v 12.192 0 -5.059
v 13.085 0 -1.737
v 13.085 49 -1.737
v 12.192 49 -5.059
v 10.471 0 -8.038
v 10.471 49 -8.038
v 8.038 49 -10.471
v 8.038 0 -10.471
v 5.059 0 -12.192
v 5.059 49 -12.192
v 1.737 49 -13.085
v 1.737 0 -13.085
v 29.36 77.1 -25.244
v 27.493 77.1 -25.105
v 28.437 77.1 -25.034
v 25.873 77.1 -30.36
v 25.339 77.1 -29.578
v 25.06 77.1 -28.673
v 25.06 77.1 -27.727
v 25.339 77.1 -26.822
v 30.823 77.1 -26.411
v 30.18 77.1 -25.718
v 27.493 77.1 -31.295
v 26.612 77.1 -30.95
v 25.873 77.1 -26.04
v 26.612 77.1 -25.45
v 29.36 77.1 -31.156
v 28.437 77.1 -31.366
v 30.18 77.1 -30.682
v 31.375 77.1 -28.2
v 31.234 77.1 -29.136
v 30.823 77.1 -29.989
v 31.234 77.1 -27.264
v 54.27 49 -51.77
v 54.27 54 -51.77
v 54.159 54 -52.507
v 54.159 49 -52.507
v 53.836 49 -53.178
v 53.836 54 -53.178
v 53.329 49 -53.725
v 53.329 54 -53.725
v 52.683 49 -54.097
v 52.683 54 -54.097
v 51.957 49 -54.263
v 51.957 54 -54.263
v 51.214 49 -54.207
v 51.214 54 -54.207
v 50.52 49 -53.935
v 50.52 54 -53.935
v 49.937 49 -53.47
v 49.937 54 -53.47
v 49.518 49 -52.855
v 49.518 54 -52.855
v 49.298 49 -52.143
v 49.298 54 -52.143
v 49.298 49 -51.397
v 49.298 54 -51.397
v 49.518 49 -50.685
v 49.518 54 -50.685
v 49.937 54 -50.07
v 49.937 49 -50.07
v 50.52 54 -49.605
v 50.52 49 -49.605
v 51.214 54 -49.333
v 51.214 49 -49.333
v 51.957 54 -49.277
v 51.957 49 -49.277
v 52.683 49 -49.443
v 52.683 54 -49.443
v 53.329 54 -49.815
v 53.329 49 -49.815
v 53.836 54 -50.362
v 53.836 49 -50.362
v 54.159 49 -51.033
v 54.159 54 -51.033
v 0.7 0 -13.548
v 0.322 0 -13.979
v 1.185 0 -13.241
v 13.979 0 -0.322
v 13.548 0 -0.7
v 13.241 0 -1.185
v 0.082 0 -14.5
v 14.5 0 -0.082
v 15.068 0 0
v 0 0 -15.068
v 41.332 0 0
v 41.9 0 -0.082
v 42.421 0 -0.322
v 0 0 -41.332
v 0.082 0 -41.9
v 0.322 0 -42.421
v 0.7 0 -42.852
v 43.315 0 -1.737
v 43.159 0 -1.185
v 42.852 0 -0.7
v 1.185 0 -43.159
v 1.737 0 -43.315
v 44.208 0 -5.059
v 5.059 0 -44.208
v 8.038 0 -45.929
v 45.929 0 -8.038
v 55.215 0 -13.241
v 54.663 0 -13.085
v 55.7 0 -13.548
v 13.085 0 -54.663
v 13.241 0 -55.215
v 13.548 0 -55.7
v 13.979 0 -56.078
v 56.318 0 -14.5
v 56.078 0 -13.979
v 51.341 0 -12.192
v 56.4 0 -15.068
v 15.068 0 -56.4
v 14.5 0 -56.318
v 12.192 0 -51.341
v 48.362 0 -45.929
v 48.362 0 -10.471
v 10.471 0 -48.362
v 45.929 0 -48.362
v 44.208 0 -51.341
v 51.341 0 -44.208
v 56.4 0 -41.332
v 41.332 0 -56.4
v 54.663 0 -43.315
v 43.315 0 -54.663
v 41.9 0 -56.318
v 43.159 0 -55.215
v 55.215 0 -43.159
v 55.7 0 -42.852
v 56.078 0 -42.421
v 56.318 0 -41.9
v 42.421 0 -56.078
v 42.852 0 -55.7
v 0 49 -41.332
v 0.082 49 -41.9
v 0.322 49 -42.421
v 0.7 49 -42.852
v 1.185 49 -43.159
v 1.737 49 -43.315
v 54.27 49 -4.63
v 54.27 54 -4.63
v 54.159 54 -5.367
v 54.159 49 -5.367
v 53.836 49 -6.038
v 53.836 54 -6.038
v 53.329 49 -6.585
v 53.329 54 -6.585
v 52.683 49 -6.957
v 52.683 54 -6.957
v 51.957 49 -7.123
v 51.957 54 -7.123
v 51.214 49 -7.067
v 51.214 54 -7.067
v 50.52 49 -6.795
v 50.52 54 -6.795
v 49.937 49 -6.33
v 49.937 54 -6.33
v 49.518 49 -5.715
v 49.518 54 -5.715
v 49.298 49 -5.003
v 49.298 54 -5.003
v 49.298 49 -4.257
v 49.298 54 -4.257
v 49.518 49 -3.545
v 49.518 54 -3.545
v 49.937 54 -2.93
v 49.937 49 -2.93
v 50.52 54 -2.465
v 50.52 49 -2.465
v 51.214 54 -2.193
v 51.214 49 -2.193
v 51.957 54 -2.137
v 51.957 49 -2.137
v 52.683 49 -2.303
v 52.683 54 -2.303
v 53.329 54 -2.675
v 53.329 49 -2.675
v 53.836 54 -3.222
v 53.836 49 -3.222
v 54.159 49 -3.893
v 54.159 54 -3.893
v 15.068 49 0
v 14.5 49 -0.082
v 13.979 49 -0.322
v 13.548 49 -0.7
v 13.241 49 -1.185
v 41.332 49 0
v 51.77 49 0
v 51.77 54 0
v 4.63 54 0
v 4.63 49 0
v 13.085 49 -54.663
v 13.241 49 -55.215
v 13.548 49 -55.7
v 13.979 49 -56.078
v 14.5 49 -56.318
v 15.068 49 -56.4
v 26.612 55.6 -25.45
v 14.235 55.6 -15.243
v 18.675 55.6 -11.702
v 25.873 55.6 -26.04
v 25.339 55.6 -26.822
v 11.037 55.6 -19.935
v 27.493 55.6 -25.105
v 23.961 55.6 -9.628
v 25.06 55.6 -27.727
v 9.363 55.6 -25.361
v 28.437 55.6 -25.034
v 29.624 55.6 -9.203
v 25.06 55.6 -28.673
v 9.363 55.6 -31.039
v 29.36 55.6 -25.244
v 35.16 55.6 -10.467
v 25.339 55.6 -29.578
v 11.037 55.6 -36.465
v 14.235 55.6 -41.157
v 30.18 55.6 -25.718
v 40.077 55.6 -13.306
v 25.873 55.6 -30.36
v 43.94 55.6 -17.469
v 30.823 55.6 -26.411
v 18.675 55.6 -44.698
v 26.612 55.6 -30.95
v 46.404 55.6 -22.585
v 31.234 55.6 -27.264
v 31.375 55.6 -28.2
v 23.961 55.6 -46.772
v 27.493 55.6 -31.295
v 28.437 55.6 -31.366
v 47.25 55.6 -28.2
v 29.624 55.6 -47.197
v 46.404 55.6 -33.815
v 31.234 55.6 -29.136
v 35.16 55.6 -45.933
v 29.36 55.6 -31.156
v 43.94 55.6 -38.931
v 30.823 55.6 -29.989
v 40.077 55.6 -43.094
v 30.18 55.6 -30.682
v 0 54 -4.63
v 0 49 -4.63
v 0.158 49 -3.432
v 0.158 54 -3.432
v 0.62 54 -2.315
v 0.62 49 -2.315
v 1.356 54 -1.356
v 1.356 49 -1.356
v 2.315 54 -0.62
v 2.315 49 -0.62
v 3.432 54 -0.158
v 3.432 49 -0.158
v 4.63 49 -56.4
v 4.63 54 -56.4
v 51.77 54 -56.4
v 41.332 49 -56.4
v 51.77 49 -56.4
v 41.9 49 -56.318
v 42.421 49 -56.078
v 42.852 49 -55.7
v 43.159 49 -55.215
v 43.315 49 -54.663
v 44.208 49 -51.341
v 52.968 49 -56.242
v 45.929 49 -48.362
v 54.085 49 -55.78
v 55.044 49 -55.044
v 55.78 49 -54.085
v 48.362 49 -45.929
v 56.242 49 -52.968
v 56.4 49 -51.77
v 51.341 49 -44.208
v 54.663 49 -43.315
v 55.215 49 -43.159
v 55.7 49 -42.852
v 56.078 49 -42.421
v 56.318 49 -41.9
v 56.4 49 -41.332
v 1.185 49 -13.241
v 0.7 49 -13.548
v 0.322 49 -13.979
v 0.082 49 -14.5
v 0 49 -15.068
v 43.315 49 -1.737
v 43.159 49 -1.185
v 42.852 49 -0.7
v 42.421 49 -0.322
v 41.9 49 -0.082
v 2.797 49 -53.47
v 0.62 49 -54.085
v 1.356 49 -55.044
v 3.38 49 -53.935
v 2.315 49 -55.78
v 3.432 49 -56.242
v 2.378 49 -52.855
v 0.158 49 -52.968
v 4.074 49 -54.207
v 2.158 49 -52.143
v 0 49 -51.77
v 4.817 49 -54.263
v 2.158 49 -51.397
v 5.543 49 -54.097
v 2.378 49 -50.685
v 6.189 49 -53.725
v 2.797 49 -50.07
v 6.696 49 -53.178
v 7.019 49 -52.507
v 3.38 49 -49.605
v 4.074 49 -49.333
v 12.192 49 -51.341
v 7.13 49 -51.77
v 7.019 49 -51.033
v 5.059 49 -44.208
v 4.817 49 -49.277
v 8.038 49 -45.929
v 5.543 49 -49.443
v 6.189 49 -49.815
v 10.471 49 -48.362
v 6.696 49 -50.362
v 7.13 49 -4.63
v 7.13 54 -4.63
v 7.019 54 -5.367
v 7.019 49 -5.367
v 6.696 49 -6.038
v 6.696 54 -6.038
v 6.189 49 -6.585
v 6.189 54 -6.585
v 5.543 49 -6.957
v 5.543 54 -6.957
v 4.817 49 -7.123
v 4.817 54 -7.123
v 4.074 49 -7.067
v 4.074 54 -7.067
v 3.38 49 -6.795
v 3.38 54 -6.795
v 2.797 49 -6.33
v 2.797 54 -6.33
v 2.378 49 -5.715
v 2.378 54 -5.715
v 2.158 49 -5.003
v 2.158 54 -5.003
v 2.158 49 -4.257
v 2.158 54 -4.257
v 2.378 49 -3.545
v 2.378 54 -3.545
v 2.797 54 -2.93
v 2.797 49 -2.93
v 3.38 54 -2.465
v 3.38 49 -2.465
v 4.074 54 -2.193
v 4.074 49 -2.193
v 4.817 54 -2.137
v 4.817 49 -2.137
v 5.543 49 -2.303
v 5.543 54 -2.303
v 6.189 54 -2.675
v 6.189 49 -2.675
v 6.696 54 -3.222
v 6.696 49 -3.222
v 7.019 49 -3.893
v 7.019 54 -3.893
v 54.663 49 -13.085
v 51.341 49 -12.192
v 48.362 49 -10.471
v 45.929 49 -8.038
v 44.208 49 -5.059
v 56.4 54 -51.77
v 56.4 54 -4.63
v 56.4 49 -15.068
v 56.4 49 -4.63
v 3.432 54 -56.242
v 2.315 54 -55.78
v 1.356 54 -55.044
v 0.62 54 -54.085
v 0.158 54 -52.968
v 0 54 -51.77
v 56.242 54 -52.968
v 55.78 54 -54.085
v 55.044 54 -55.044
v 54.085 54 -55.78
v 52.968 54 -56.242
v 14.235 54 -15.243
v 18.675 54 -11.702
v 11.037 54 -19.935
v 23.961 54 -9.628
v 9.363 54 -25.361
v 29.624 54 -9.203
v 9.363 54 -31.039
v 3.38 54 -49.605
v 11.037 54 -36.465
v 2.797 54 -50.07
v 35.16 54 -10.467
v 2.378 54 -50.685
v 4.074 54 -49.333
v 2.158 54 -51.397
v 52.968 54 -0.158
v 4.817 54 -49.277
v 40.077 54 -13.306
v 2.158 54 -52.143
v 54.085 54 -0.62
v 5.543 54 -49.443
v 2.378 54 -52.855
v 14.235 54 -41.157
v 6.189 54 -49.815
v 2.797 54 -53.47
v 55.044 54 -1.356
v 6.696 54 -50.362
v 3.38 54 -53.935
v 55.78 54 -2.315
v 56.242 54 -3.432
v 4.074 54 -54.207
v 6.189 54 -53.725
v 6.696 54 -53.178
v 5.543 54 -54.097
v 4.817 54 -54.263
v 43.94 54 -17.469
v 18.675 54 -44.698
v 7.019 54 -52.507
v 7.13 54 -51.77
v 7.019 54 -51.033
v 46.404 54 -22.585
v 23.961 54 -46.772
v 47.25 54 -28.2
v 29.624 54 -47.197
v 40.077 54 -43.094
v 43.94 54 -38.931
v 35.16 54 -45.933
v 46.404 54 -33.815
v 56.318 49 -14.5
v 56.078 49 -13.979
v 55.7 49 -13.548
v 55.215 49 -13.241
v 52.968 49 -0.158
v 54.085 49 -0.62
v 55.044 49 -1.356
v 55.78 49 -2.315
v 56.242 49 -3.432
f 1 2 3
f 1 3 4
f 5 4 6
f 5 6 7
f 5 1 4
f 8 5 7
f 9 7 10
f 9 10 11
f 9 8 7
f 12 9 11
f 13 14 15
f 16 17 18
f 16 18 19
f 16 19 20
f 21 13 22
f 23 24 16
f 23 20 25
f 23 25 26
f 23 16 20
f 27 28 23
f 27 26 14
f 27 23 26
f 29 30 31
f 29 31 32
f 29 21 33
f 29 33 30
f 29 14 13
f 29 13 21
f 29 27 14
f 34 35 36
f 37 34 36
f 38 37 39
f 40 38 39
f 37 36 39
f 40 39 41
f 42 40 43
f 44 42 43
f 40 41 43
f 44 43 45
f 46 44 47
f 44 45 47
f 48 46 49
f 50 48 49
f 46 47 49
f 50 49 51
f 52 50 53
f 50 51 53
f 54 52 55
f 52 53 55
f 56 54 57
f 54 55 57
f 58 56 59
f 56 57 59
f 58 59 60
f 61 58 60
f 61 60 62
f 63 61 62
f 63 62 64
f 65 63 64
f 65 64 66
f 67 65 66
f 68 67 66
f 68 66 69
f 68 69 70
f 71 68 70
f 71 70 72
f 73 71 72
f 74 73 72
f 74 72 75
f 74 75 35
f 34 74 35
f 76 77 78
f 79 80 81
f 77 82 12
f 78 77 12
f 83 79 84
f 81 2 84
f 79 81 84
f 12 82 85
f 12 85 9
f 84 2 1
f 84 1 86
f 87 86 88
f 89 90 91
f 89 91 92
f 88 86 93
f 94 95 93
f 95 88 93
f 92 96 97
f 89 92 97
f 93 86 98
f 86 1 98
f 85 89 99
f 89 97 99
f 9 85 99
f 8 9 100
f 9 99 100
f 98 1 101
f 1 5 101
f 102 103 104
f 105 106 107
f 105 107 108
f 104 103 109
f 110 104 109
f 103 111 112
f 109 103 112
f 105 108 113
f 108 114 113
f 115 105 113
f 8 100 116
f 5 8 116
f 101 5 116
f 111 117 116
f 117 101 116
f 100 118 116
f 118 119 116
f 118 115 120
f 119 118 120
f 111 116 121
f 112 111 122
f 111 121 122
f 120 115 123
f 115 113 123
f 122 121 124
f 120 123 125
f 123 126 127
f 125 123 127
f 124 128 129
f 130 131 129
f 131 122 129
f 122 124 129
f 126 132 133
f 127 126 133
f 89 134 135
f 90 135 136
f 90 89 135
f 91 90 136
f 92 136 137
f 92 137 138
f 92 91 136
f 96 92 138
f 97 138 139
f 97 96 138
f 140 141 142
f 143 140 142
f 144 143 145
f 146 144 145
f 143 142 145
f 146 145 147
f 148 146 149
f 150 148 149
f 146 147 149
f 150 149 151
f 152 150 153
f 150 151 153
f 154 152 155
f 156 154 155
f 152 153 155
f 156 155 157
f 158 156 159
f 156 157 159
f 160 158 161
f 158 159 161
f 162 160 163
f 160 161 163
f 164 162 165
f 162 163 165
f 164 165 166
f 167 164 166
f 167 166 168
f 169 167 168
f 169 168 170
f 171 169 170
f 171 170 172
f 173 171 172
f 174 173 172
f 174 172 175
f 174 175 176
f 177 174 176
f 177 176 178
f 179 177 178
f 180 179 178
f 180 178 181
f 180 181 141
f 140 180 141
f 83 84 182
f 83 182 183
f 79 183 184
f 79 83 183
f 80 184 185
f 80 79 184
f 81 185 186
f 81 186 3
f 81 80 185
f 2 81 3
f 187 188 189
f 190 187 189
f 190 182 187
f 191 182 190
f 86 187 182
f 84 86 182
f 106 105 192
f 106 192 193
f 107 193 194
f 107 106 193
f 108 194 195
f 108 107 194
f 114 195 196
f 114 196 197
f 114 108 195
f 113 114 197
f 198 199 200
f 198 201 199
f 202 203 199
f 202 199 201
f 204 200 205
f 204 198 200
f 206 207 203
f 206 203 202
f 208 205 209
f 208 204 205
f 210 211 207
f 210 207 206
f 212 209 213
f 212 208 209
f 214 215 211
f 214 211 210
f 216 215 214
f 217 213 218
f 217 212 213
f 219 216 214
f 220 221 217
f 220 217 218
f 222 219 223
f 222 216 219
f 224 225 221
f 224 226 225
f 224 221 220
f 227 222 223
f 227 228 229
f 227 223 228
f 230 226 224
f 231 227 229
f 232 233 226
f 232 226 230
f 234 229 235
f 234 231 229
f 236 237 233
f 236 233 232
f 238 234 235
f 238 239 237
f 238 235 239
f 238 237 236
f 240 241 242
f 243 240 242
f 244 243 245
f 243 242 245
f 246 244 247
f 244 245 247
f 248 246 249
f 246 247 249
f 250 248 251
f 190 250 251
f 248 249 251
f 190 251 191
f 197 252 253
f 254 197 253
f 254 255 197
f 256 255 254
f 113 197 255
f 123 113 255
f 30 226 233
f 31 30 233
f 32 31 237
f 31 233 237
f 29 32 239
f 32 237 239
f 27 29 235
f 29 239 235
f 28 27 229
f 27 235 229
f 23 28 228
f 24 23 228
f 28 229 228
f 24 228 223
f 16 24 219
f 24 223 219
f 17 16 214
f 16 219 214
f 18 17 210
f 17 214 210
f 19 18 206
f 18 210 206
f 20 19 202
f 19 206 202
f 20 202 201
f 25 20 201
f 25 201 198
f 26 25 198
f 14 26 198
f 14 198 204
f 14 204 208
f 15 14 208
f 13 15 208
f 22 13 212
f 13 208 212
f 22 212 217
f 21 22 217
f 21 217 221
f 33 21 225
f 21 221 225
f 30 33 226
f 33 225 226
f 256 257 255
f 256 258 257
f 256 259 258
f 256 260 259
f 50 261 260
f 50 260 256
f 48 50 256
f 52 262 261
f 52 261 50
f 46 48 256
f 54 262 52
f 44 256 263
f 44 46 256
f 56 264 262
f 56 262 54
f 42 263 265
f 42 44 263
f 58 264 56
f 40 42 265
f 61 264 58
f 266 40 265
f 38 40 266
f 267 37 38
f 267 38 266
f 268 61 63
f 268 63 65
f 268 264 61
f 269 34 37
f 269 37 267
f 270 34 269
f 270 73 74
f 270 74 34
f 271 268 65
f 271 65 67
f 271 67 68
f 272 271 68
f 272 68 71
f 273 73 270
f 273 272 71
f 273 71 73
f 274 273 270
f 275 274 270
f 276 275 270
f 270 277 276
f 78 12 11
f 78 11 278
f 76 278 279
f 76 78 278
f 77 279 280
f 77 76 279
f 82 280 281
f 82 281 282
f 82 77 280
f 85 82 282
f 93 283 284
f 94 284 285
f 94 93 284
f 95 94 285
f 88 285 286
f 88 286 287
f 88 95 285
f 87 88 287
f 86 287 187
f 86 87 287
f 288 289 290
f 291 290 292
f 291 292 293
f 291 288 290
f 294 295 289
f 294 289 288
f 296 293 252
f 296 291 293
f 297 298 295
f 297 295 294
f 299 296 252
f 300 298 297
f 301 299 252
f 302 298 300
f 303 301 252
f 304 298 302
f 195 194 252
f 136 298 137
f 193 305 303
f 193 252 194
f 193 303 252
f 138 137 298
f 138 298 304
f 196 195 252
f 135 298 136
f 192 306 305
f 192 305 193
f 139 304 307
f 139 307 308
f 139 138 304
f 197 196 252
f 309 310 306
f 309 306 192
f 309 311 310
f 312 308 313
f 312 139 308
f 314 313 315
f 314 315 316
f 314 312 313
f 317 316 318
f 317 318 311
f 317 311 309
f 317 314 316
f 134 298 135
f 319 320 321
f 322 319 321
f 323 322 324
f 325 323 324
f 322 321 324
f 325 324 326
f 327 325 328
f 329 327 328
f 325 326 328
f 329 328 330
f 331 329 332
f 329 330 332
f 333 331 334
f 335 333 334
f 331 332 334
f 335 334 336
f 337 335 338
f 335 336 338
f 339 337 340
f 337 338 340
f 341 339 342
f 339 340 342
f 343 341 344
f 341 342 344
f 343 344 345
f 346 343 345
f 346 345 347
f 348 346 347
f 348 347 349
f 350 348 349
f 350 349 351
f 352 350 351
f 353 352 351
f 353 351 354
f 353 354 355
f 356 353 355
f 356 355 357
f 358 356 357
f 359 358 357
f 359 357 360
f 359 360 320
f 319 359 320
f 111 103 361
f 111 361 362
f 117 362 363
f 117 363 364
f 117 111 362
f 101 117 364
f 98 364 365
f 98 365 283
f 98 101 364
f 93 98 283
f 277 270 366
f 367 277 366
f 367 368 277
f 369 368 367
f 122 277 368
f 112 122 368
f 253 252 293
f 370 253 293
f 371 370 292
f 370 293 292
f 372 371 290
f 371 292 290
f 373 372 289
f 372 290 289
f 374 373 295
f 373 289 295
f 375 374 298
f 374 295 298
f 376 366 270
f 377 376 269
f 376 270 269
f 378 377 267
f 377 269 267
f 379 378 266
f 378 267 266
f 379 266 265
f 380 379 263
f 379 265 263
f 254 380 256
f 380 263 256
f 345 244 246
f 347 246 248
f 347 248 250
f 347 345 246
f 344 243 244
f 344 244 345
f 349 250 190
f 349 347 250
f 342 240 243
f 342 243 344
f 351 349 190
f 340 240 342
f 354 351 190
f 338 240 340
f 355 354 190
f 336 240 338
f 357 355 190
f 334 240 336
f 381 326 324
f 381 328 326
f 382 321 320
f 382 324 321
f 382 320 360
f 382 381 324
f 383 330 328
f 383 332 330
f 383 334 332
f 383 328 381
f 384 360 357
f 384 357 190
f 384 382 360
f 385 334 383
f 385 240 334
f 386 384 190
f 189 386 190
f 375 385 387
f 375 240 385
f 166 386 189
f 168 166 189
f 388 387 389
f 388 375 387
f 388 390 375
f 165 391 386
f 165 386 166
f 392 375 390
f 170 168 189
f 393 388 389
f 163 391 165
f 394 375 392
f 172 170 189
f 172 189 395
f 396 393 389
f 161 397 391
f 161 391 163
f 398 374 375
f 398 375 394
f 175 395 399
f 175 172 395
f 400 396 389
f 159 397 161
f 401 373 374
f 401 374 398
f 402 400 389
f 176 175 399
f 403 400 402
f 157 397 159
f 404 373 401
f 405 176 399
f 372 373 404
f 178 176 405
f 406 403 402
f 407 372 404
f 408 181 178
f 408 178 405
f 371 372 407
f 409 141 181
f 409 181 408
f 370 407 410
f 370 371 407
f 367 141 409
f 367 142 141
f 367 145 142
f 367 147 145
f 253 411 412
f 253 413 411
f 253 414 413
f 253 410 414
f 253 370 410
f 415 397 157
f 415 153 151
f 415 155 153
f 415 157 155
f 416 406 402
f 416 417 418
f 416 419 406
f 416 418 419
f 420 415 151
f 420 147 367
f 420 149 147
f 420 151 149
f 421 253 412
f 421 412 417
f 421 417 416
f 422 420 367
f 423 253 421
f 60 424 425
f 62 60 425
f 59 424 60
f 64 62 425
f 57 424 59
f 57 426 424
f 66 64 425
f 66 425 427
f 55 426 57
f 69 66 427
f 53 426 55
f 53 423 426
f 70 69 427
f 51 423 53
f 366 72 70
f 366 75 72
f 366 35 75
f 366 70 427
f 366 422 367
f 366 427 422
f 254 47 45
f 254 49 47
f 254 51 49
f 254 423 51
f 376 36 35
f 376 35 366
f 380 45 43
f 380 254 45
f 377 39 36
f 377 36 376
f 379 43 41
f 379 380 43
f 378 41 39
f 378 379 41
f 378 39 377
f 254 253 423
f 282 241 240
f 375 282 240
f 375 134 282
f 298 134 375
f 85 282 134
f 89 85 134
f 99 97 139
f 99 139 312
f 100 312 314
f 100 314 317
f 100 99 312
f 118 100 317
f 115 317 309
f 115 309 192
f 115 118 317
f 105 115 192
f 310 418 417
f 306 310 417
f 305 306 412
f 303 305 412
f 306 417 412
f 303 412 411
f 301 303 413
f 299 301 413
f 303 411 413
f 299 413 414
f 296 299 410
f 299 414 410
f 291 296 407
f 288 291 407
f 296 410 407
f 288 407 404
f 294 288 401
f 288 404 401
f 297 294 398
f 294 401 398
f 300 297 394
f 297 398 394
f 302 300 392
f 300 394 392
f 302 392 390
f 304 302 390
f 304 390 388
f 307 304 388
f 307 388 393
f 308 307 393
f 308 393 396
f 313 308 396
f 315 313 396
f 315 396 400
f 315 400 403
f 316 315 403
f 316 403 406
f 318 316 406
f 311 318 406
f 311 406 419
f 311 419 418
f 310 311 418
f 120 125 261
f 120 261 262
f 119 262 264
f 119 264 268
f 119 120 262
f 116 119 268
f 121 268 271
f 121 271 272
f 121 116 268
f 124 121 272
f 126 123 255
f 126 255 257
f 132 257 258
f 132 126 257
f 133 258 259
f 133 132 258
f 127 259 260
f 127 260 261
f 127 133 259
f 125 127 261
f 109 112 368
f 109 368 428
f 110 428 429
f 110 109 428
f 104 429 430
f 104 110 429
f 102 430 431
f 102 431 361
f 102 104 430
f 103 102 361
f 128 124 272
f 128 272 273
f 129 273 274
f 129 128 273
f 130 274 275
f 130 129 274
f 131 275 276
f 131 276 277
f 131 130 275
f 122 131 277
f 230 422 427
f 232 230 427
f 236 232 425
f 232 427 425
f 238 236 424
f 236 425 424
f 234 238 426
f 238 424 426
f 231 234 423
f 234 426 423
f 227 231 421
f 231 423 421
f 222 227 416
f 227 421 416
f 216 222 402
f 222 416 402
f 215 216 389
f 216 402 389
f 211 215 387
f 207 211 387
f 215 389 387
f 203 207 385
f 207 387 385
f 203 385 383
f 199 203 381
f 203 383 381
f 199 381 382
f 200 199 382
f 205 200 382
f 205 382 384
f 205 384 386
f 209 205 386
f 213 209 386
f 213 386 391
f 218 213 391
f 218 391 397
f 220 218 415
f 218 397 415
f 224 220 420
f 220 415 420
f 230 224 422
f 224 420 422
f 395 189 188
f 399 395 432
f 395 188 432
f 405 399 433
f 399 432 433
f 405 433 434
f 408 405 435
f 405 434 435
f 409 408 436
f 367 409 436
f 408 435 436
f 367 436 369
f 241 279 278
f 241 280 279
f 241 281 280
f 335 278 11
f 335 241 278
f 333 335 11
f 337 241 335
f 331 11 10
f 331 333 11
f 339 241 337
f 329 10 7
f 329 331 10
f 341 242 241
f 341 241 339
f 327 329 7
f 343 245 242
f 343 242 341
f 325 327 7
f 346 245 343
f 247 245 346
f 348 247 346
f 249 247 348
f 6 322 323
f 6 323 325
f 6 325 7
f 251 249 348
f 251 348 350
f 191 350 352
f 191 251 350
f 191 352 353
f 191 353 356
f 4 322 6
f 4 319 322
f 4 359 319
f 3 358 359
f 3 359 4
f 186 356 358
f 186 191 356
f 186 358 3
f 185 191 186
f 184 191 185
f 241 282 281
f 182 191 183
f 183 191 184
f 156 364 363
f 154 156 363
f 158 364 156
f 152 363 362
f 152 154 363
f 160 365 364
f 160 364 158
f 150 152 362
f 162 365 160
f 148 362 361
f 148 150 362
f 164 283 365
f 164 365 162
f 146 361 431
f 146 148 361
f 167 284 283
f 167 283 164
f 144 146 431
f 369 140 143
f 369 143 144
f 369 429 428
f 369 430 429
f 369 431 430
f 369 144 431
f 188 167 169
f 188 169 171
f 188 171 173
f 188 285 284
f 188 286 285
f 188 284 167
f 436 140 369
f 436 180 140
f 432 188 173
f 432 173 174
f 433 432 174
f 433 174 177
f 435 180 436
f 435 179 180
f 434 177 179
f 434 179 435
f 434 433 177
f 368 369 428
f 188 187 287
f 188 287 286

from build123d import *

# Parameters (mm, degrees)
BOSS_EXTRUDE1_DEPTH = 54
SKETCH2_R           = 2.5
CUT_EXTRUDE1_DEPTH  = 54
SKETCH3_OUTSIDE_W   = 77.664
SKETCH3_OUTSIDE_H   = 77.664
CUT_EXTRUDE3_DEPTH  = 49
SKETCH4_R           = 19.05
BOSS_EXTRUDE2_DEPTH = 1.6
SKETCH5_R           = 3.175
BOSS_EXTRUDE3_DEPTH = 21.5


with BuildPart() as part:
    # Sketch1 → Boss-Extrude1 (new body)
    with BuildSketch(Plane(origin=(0, 0, 0), x_dir=(1, 0, 0), z_dir=(0, 1, 0))):
        with BuildLine():
            Line((0, 51.77), (0, 4.63))
            ThreePointArc((0, 4.63), (1.356095603, 1.356095603), (4.63, 0))
            Line((4.63, 0), (51.77, 0))
            ThreePointArc((51.77, 0), (55.043904397, 1.356095603), (56.4, 4.63))
            Line((56.4, 4.63), (56.4, 51.77))
            ThreePointArc((56.4, 51.77), (55.043904397, 55.043904397), (51.77, 56.4))
            Line((51.77, 56.4), (4.63, 56.4))
            ThreePointArc((4.63, 56.4), (1.356095603, 55.043904397), (0, 51.77))
        make_face()
    extrude(amount=BOSS_EXTRUDE1_DEPTH)

    # Sketch2 → Cut-Extrude1 (cut)
    with BuildSketch(Plane(origin=(0, 54, 0), x_dir=(1, 0, 0), z_dir=(0, 1, 0))):
        with Locations((4.63, 51.77)):
            Circle(SKETCH2_R)
        with Locations((51.77, 51.77)):
            Circle(SKETCH2_R)
        with Locations((51.77, 4.63)):
            Circle(SKETCH2_R)
        with Locations((4.63, 4.63)):
            Circle(SKETCH2_R)
    extrude(amount=-CUT_EXTRUDE1_DEPTH, mode=Mode.SUBTRACT)

    # Sketch3 outside → Cut-Extrude3 (cut)
    with BuildSketch(Plane.XZ):
        with Locations((28.2, -28.2)):
            Rectangle(SKETCH3_OUTSIDE_W, SKETCH3_OUTSIDE_H)
        with BuildLine():
            Line((15.067846561, -56.4), (41.332153439, -56.4))
            ThreePointArc((41.332153439, -56.4), (42.650046494, -55.904379571), (43.314764828, -54.663157895))
            ThreePointArc((43.314764828, -54.663157895), (47.066190488, -47.066190488), (54.663157895, -43.314764828))
            ThreePointArc((54.663157895, -43.314764828), (55.904379571, -42.650046494), (56.4, -41.332153439))
            Line((56.4, -41.332153439), (56.4, -15.067846561))
            ThreePointArc((56.4, -15.067846561), (55.904379571, -13.749953506), (54.663157895, -13.085235172))
            ThreePointArc((54.663157895, -13.085235172), (47.066190488, -9.333809512), (43.314764828, -1.736842105))
            ThreePointArc((43.314764828, -1.736842105), (42.650046494, -0.495620429), (41.332153439, 0))
            Line((41.332153439, 0), (15.067846561, 0))
            ThreePointArc((15.067846561, 0), (13.749953506, -0.495620429), (13.085235172, -1.736842105))
            ThreePointArc((13.085235172, -1.736842105), (9.333809512, -9.333809512), (1.736842105, -13.085235172))
            ThreePointArc((1.736842105, -13.085235172), (0.495620429, -13.749953506), (0, -15.067846561))
            Line((0, -15.067846561), (0, -41.332153439))
            ThreePointArc((0, -41.332153439), (0.495620429, -42.650046494), (1.736842105, -43.314764828))
            ThreePointArc((1.736842105, -43.314764828), (9.333809512, -47.066190488), (13.085235172, -54.663157895))
            ThreePointArc((13.085235172, -54.663157895), (13.749953506, -55.904379571), (15.067846561, -56.4))
        make_face(mode=Mode.SUBTRACT)
    extrude(amount=-CUT_EXTRUDE3_DEPTH, mode=Mode.SUBTRACT)

    # Sketch4 → Boss-Extrude2 (add)
    with BuildSketch(Plane(origin=(0, 54, 0), x_dir=(1, 0, 0), z_dir=(0, 1, 0))):
        with Locations((28.2, 28.2)):
            Circle(SKETCH4_R)
    extrude(amount=BOSS_EXTRUDE2_DEPTH)

    # Sketch5 → Boss-Extrude3 (add)
    with BuildSketch(Plane(origin=(0, 55.6, 0), x_dir=(1, 0, 0), z_dir=(0, 1, 0))):
        with Locations((28.2, 28.2)):
            Circle(SKETCH5_R)
    extrude(amount=BOSS_EXTRUDE3_DEPTH)


solid = part.part
